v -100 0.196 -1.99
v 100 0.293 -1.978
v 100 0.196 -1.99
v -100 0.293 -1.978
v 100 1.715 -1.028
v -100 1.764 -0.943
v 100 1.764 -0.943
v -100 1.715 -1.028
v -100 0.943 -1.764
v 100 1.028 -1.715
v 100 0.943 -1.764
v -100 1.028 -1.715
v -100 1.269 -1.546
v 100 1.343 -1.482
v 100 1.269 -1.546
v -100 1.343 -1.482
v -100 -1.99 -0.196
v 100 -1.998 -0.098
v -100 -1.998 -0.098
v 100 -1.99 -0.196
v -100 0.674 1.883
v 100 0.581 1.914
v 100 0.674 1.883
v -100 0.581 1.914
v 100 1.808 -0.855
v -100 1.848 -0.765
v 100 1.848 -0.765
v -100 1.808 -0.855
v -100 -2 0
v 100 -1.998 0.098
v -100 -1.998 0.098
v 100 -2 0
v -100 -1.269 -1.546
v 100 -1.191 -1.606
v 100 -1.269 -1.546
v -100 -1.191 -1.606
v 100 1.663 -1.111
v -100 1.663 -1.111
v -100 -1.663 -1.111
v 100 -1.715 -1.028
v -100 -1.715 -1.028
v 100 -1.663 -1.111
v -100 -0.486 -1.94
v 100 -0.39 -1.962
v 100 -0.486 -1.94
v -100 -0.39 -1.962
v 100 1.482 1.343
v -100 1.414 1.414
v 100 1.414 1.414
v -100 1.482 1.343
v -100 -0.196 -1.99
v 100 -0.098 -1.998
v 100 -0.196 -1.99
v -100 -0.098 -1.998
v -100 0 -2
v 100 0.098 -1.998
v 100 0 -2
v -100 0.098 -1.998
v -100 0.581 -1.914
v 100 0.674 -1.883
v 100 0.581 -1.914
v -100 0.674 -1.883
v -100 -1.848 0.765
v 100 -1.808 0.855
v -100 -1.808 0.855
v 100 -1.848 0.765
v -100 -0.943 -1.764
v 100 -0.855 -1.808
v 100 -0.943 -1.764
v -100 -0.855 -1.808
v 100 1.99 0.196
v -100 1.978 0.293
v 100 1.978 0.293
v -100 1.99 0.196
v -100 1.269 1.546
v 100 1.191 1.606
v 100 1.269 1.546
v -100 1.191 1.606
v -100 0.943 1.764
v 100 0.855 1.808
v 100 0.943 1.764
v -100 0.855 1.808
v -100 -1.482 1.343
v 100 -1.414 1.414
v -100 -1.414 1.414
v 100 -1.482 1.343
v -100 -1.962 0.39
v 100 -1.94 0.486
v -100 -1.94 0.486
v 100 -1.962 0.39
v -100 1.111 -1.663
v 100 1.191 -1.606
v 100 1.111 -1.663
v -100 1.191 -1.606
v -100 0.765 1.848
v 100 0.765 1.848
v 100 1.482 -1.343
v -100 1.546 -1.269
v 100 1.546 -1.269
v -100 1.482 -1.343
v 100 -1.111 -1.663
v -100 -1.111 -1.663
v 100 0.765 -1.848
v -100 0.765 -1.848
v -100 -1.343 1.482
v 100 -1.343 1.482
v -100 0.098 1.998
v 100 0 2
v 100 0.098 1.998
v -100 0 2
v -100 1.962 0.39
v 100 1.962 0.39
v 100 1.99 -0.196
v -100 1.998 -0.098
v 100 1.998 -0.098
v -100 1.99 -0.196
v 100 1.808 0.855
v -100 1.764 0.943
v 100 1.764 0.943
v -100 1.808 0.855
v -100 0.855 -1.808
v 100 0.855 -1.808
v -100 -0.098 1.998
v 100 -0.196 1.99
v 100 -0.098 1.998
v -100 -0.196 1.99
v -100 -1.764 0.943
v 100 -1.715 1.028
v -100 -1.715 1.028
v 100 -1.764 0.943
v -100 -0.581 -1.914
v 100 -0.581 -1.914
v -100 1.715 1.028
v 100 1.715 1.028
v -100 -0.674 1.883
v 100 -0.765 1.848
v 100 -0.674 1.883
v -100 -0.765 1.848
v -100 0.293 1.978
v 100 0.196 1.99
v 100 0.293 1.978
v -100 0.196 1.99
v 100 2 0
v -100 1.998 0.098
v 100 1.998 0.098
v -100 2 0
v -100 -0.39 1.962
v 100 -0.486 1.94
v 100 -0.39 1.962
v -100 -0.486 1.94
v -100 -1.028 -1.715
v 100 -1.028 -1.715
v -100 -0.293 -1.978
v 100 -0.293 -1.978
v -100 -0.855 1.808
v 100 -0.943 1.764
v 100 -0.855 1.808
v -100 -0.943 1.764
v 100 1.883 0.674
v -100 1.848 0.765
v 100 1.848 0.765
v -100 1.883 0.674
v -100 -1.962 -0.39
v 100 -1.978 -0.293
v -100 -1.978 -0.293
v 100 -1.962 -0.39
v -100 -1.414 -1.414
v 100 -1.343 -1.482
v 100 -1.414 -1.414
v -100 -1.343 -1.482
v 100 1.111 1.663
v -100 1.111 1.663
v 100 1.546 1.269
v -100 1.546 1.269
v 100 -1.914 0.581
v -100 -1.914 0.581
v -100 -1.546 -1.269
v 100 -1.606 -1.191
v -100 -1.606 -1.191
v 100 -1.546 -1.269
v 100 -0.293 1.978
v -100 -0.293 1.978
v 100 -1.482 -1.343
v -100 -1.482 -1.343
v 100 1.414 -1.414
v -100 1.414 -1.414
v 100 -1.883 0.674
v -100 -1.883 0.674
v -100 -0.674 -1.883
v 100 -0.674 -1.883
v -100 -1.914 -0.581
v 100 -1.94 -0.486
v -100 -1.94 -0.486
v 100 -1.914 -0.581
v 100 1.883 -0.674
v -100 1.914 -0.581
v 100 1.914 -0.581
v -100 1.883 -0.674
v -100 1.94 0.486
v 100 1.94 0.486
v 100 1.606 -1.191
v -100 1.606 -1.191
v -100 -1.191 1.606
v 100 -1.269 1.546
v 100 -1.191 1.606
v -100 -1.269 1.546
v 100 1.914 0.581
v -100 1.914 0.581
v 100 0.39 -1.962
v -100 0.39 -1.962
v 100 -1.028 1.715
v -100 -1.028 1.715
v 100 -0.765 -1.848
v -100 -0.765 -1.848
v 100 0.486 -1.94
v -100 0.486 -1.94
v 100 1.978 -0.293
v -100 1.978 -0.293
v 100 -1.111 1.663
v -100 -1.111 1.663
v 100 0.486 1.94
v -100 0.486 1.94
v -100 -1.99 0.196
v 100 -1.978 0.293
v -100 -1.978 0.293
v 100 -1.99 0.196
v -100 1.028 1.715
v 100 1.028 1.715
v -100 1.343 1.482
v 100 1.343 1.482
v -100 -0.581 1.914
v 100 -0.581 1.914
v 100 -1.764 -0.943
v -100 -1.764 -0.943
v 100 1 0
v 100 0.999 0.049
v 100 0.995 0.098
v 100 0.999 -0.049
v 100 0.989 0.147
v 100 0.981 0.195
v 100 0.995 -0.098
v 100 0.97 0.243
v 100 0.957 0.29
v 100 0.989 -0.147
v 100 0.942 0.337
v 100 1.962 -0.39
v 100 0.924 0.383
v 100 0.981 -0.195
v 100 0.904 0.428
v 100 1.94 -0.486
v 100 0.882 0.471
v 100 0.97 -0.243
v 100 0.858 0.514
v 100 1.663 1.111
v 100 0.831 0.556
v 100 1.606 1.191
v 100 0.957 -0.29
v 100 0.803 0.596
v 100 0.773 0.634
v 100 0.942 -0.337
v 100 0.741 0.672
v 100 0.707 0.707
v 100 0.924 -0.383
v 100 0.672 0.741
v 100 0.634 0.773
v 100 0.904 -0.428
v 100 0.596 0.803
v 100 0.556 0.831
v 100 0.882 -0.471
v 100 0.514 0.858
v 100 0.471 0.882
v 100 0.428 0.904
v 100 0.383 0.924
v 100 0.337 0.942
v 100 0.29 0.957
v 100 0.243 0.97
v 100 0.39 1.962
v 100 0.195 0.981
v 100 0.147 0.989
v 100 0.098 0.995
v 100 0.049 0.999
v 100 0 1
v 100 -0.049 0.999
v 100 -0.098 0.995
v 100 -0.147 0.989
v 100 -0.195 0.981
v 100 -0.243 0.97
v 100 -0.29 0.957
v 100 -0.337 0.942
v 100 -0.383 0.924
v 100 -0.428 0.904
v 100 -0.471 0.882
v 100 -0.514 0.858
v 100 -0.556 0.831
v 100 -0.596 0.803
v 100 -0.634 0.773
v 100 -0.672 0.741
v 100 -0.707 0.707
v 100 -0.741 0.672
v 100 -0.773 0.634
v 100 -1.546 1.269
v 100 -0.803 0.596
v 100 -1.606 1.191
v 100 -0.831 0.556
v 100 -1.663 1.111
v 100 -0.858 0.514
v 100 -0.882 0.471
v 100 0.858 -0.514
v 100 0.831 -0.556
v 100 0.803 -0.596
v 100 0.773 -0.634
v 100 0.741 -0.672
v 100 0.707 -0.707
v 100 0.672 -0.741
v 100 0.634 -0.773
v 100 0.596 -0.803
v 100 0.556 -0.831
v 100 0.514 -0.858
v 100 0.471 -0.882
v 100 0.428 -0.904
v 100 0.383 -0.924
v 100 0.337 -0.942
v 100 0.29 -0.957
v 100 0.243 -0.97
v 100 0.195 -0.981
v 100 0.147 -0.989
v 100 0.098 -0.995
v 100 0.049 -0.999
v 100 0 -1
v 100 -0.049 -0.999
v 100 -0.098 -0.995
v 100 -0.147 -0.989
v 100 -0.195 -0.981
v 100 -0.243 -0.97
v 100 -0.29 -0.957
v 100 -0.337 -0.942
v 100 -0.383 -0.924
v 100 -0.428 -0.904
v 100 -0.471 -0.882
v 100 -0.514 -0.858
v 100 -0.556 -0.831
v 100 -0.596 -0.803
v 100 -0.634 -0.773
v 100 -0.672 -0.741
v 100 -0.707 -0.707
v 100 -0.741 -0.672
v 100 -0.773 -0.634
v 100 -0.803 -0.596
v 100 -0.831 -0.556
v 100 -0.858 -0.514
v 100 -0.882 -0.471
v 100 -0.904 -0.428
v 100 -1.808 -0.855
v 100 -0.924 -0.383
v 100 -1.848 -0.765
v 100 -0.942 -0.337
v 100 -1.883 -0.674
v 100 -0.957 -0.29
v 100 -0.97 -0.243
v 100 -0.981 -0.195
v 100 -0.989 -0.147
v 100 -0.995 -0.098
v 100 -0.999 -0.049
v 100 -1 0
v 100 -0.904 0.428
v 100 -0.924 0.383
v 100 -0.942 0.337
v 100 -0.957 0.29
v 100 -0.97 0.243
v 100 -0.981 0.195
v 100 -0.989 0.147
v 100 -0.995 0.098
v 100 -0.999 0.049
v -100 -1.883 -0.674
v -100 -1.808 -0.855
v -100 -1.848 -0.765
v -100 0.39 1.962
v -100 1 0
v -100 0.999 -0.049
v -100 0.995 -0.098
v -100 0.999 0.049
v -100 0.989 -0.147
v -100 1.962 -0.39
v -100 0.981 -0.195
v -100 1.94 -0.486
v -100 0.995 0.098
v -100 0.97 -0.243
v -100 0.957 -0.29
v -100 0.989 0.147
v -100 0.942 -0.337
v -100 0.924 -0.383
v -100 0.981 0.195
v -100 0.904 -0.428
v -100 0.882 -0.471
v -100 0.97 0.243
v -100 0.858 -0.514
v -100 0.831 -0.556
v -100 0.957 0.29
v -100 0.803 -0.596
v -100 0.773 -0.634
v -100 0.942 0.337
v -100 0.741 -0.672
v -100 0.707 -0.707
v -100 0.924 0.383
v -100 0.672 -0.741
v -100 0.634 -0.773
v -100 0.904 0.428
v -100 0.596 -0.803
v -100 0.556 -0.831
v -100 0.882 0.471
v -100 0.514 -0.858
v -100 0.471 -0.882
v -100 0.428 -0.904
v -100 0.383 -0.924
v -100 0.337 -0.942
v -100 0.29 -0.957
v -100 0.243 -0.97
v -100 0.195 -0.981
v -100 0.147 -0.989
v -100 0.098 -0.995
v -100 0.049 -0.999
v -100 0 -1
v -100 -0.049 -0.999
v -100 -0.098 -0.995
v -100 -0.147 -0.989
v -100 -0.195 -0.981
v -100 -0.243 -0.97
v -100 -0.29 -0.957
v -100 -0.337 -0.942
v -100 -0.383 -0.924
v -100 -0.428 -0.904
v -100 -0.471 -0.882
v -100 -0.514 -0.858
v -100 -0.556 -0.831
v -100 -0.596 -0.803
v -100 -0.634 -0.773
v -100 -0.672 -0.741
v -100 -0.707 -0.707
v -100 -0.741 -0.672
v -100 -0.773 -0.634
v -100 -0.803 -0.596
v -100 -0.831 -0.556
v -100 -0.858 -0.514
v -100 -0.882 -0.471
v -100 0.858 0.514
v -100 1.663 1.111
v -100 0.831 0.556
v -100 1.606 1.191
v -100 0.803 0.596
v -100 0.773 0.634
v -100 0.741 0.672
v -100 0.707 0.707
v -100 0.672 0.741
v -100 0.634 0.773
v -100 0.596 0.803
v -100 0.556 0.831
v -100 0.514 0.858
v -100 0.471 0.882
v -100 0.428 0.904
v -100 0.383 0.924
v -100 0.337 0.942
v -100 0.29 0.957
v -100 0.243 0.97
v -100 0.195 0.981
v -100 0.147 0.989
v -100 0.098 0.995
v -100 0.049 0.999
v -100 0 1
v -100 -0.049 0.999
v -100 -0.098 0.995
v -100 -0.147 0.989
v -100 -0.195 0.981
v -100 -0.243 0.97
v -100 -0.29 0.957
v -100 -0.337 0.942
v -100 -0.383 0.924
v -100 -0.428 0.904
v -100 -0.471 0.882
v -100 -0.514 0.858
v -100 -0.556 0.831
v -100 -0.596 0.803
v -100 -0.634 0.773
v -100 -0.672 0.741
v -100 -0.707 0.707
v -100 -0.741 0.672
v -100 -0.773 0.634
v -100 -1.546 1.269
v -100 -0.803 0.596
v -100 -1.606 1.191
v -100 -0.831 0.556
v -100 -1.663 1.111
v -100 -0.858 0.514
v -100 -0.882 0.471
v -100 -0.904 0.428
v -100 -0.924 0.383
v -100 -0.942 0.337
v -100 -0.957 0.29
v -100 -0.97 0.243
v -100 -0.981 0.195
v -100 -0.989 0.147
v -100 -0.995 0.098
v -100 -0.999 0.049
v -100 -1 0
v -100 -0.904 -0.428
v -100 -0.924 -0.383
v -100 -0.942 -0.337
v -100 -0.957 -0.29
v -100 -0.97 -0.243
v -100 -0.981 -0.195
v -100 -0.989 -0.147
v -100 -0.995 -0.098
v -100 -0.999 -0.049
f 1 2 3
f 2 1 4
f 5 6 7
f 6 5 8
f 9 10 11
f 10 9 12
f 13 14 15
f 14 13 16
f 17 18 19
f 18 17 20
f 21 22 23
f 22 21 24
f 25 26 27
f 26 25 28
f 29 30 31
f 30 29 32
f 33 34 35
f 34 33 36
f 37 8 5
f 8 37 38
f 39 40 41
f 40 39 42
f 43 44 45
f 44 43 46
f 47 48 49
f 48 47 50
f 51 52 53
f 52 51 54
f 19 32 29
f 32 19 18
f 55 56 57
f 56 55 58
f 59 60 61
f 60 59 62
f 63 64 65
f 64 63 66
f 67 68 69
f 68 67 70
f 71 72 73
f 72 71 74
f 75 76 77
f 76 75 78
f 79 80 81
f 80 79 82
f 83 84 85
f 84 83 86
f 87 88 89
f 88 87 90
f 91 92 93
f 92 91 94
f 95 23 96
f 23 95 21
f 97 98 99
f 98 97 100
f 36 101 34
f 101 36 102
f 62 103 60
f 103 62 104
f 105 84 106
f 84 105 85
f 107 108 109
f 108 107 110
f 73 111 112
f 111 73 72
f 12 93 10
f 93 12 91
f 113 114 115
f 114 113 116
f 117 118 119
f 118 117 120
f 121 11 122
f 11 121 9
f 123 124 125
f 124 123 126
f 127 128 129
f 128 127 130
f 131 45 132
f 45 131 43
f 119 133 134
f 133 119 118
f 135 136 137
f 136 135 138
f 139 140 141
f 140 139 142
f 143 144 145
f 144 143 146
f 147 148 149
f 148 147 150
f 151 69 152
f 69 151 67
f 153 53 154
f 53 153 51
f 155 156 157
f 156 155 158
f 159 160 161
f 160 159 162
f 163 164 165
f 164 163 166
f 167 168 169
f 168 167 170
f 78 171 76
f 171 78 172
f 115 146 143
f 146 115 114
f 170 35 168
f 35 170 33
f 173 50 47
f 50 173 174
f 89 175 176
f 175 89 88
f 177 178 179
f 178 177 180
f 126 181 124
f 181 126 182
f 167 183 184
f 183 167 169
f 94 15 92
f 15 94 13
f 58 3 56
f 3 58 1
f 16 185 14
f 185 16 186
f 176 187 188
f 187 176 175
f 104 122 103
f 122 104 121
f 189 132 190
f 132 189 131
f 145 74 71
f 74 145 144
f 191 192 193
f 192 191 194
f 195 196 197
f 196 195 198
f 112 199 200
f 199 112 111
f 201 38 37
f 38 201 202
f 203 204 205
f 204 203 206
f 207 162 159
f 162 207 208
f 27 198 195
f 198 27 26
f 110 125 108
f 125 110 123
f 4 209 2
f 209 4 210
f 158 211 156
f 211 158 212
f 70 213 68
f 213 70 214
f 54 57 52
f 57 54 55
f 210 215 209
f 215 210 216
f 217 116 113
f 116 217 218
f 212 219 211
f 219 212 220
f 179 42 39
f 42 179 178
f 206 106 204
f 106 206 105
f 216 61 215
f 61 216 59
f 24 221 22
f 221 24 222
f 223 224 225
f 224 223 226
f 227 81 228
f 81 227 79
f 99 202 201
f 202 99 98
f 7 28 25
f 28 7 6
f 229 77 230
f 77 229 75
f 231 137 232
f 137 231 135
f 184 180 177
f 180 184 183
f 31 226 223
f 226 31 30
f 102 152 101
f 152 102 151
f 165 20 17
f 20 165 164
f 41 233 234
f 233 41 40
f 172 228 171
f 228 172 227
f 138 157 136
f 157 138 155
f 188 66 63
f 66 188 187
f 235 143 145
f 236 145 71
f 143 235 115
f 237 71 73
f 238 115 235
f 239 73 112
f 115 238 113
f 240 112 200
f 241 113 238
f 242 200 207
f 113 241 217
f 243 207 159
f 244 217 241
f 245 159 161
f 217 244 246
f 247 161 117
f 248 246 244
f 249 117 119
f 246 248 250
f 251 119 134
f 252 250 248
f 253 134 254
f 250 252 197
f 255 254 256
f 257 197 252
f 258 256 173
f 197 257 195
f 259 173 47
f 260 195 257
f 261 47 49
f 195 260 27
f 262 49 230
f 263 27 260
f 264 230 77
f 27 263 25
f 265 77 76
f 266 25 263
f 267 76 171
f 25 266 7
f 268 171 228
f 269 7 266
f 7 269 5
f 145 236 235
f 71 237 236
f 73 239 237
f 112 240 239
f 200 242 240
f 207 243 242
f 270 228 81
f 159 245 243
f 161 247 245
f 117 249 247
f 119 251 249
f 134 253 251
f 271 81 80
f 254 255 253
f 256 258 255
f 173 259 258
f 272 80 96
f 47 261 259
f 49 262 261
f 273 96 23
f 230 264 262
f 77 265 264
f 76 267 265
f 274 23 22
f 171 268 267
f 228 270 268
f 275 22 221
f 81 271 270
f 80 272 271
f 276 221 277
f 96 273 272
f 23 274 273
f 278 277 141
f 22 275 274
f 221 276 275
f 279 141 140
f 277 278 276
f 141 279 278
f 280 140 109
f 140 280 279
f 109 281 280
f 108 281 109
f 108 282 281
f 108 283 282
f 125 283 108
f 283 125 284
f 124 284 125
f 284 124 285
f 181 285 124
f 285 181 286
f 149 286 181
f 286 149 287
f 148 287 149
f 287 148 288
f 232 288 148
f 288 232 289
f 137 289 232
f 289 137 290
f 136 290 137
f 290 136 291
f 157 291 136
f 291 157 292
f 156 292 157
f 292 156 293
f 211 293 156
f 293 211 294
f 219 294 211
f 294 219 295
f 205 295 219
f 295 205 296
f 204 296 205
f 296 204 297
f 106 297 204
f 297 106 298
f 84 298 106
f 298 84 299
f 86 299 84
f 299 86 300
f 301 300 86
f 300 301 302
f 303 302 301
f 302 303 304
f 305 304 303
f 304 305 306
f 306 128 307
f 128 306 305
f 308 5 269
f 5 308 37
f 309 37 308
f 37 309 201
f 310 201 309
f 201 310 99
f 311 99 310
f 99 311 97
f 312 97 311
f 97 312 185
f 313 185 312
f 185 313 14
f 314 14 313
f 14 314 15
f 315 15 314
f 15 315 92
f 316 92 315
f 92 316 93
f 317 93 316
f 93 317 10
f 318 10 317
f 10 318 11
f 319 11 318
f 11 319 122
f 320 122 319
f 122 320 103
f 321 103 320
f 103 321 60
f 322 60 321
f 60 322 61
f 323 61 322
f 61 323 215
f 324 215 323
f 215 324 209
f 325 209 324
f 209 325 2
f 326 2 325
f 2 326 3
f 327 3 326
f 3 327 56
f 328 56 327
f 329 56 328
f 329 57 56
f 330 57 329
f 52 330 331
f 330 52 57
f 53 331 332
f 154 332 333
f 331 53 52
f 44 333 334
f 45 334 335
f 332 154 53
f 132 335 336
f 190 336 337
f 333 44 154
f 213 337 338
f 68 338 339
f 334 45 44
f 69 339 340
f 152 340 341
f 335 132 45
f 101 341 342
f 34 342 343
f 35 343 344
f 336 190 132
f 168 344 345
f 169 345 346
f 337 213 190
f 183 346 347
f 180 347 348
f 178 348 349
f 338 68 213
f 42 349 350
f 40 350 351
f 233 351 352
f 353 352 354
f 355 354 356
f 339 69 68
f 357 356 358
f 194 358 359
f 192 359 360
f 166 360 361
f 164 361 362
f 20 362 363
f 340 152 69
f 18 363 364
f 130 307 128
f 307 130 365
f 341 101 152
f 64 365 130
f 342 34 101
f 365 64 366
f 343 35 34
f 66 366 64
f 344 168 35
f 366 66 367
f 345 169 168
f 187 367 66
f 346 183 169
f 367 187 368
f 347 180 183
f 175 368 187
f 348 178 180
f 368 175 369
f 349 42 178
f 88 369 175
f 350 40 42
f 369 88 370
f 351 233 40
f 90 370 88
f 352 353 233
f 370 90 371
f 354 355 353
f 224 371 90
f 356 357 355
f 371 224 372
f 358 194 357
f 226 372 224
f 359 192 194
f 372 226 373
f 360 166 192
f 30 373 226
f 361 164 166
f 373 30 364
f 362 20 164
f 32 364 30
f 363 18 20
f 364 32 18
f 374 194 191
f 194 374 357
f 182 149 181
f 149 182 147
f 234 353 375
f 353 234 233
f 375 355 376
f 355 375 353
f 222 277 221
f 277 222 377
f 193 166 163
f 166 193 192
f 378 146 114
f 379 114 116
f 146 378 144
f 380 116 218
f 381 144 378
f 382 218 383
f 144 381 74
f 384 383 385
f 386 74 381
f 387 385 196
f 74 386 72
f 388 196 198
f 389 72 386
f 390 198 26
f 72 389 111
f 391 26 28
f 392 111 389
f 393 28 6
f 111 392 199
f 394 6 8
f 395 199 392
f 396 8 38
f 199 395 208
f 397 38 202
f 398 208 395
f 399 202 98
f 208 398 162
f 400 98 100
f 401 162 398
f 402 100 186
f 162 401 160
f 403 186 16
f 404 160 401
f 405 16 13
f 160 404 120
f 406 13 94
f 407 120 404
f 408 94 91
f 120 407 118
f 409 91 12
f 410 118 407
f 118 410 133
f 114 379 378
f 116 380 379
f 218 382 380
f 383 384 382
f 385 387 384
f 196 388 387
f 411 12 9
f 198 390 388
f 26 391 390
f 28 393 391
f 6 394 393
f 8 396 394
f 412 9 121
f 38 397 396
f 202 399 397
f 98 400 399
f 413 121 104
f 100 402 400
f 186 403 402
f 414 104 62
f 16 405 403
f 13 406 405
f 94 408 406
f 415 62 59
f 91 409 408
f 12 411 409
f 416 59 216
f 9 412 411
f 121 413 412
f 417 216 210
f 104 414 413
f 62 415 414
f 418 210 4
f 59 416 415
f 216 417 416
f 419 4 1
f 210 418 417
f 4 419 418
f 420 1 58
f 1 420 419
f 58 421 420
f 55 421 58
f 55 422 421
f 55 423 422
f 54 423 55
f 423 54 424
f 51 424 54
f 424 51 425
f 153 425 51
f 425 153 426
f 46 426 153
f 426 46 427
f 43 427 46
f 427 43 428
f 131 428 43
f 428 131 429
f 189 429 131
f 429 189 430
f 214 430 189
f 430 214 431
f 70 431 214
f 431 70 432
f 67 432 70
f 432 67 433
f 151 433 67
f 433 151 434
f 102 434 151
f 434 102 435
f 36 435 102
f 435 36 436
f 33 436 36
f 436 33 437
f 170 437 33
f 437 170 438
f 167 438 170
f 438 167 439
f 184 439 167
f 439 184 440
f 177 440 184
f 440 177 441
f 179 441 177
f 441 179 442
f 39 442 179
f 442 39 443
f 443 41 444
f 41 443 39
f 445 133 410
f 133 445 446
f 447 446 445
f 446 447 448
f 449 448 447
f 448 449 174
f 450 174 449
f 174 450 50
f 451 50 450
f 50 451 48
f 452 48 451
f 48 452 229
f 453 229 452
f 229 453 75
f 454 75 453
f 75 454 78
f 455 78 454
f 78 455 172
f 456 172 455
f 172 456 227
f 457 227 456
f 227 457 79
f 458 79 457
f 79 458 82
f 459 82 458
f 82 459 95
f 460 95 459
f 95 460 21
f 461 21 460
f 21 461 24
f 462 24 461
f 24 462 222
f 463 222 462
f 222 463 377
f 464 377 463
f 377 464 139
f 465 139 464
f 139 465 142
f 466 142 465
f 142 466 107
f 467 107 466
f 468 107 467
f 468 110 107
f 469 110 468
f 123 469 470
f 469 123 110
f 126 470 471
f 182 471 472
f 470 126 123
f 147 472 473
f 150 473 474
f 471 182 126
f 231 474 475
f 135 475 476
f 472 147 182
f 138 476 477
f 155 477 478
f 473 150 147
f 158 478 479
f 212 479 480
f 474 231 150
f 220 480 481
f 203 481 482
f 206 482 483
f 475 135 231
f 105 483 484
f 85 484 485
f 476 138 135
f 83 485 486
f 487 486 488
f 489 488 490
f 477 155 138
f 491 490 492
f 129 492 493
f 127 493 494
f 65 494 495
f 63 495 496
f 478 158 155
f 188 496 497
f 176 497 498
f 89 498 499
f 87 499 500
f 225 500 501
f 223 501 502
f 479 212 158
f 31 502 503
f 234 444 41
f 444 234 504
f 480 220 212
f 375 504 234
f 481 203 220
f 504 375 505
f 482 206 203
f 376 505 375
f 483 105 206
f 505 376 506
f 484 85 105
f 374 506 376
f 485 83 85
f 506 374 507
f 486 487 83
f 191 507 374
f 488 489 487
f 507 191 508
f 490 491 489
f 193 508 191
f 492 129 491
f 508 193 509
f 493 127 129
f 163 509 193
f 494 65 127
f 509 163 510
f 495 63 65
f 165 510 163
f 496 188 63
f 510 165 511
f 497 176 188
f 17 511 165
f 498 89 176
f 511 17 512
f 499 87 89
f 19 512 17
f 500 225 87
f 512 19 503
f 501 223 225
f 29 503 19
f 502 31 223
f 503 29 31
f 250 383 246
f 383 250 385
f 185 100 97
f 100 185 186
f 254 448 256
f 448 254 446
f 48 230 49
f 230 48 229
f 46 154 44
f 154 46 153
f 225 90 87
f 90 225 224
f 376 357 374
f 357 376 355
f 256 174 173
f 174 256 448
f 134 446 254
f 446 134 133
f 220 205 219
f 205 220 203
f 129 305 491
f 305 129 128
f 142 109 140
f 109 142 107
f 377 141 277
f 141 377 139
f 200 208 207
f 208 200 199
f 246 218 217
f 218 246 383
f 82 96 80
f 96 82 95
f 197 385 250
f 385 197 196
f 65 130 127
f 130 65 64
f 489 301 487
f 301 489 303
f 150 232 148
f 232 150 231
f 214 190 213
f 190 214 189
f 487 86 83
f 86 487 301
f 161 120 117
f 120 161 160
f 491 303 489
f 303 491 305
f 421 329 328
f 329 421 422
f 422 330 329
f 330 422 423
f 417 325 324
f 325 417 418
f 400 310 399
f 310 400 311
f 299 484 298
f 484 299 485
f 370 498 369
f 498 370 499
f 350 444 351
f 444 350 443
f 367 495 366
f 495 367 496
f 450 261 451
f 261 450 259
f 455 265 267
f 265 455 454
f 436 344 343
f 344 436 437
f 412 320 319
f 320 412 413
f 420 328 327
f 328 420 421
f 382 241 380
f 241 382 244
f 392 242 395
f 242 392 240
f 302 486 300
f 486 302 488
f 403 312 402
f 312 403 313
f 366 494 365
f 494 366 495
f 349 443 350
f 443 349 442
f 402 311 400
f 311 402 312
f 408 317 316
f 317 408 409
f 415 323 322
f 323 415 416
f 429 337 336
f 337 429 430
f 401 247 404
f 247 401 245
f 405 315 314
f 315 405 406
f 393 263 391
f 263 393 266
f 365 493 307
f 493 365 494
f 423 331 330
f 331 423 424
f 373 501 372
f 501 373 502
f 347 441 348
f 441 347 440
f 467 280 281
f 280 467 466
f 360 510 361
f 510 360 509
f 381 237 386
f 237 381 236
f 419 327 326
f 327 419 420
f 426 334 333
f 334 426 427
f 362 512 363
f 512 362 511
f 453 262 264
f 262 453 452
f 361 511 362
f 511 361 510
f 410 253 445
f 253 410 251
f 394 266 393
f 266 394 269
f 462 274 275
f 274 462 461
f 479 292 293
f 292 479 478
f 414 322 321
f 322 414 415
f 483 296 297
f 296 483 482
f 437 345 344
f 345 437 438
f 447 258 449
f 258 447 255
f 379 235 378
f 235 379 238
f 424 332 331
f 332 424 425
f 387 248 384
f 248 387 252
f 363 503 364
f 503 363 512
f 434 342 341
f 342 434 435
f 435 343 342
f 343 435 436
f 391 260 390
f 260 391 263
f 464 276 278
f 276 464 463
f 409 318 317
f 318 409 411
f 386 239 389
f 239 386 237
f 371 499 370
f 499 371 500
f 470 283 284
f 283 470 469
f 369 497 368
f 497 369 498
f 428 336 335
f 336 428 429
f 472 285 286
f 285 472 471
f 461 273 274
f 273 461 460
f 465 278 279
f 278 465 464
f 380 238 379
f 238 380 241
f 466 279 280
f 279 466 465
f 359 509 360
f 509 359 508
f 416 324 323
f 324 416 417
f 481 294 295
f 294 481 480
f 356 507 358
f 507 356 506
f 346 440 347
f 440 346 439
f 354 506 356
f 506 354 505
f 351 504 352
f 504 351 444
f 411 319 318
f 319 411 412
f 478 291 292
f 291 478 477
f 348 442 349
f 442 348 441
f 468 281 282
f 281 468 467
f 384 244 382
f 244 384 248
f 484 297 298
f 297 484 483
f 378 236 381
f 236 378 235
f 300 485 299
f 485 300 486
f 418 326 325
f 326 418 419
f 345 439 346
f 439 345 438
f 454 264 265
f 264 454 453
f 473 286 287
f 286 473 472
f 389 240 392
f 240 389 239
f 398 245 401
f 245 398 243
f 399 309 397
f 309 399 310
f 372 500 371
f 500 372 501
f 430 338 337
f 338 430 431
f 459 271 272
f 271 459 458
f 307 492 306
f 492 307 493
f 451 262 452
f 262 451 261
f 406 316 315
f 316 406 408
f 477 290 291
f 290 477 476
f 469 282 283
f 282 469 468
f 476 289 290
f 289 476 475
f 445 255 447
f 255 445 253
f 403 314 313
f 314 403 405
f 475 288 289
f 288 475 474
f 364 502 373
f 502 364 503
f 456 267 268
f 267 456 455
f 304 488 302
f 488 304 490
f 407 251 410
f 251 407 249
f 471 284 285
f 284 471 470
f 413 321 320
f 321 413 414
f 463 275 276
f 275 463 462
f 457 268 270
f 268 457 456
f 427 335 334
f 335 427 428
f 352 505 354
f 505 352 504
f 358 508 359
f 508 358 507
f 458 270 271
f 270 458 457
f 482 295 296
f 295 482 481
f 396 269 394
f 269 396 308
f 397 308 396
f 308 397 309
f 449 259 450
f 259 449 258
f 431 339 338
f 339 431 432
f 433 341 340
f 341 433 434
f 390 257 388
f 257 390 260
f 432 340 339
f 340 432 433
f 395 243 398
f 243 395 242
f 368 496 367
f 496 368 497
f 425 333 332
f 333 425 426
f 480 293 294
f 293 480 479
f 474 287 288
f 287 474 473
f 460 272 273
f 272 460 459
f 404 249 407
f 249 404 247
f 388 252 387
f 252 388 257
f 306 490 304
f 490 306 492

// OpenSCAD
$fn = 128;

// PTFE tubing (hollow cylinder) — oriented horizontally for clear side views
outer_d = 4.0;     // mm
inner_d = 2.0;     // mm
length  = 200.0;   // mm

module ptfe_tube(od, id, len) {
    eps = 0.2; // overlap to ensure clean subtraction
    difference() {
        // Outer tube
        rotate([0, 90, 0]) cylinder(d=od, h=len, center=true);
        // Inner bore (slightly longer to fully cut through)
        rotate([0, 90, 0]) cylinder(d=id, h=len + 2*eps, center=true);
    }
}

color([0.95, 0.95, 0.95])
ptfe_tube(outer_d, inner_d, length);
